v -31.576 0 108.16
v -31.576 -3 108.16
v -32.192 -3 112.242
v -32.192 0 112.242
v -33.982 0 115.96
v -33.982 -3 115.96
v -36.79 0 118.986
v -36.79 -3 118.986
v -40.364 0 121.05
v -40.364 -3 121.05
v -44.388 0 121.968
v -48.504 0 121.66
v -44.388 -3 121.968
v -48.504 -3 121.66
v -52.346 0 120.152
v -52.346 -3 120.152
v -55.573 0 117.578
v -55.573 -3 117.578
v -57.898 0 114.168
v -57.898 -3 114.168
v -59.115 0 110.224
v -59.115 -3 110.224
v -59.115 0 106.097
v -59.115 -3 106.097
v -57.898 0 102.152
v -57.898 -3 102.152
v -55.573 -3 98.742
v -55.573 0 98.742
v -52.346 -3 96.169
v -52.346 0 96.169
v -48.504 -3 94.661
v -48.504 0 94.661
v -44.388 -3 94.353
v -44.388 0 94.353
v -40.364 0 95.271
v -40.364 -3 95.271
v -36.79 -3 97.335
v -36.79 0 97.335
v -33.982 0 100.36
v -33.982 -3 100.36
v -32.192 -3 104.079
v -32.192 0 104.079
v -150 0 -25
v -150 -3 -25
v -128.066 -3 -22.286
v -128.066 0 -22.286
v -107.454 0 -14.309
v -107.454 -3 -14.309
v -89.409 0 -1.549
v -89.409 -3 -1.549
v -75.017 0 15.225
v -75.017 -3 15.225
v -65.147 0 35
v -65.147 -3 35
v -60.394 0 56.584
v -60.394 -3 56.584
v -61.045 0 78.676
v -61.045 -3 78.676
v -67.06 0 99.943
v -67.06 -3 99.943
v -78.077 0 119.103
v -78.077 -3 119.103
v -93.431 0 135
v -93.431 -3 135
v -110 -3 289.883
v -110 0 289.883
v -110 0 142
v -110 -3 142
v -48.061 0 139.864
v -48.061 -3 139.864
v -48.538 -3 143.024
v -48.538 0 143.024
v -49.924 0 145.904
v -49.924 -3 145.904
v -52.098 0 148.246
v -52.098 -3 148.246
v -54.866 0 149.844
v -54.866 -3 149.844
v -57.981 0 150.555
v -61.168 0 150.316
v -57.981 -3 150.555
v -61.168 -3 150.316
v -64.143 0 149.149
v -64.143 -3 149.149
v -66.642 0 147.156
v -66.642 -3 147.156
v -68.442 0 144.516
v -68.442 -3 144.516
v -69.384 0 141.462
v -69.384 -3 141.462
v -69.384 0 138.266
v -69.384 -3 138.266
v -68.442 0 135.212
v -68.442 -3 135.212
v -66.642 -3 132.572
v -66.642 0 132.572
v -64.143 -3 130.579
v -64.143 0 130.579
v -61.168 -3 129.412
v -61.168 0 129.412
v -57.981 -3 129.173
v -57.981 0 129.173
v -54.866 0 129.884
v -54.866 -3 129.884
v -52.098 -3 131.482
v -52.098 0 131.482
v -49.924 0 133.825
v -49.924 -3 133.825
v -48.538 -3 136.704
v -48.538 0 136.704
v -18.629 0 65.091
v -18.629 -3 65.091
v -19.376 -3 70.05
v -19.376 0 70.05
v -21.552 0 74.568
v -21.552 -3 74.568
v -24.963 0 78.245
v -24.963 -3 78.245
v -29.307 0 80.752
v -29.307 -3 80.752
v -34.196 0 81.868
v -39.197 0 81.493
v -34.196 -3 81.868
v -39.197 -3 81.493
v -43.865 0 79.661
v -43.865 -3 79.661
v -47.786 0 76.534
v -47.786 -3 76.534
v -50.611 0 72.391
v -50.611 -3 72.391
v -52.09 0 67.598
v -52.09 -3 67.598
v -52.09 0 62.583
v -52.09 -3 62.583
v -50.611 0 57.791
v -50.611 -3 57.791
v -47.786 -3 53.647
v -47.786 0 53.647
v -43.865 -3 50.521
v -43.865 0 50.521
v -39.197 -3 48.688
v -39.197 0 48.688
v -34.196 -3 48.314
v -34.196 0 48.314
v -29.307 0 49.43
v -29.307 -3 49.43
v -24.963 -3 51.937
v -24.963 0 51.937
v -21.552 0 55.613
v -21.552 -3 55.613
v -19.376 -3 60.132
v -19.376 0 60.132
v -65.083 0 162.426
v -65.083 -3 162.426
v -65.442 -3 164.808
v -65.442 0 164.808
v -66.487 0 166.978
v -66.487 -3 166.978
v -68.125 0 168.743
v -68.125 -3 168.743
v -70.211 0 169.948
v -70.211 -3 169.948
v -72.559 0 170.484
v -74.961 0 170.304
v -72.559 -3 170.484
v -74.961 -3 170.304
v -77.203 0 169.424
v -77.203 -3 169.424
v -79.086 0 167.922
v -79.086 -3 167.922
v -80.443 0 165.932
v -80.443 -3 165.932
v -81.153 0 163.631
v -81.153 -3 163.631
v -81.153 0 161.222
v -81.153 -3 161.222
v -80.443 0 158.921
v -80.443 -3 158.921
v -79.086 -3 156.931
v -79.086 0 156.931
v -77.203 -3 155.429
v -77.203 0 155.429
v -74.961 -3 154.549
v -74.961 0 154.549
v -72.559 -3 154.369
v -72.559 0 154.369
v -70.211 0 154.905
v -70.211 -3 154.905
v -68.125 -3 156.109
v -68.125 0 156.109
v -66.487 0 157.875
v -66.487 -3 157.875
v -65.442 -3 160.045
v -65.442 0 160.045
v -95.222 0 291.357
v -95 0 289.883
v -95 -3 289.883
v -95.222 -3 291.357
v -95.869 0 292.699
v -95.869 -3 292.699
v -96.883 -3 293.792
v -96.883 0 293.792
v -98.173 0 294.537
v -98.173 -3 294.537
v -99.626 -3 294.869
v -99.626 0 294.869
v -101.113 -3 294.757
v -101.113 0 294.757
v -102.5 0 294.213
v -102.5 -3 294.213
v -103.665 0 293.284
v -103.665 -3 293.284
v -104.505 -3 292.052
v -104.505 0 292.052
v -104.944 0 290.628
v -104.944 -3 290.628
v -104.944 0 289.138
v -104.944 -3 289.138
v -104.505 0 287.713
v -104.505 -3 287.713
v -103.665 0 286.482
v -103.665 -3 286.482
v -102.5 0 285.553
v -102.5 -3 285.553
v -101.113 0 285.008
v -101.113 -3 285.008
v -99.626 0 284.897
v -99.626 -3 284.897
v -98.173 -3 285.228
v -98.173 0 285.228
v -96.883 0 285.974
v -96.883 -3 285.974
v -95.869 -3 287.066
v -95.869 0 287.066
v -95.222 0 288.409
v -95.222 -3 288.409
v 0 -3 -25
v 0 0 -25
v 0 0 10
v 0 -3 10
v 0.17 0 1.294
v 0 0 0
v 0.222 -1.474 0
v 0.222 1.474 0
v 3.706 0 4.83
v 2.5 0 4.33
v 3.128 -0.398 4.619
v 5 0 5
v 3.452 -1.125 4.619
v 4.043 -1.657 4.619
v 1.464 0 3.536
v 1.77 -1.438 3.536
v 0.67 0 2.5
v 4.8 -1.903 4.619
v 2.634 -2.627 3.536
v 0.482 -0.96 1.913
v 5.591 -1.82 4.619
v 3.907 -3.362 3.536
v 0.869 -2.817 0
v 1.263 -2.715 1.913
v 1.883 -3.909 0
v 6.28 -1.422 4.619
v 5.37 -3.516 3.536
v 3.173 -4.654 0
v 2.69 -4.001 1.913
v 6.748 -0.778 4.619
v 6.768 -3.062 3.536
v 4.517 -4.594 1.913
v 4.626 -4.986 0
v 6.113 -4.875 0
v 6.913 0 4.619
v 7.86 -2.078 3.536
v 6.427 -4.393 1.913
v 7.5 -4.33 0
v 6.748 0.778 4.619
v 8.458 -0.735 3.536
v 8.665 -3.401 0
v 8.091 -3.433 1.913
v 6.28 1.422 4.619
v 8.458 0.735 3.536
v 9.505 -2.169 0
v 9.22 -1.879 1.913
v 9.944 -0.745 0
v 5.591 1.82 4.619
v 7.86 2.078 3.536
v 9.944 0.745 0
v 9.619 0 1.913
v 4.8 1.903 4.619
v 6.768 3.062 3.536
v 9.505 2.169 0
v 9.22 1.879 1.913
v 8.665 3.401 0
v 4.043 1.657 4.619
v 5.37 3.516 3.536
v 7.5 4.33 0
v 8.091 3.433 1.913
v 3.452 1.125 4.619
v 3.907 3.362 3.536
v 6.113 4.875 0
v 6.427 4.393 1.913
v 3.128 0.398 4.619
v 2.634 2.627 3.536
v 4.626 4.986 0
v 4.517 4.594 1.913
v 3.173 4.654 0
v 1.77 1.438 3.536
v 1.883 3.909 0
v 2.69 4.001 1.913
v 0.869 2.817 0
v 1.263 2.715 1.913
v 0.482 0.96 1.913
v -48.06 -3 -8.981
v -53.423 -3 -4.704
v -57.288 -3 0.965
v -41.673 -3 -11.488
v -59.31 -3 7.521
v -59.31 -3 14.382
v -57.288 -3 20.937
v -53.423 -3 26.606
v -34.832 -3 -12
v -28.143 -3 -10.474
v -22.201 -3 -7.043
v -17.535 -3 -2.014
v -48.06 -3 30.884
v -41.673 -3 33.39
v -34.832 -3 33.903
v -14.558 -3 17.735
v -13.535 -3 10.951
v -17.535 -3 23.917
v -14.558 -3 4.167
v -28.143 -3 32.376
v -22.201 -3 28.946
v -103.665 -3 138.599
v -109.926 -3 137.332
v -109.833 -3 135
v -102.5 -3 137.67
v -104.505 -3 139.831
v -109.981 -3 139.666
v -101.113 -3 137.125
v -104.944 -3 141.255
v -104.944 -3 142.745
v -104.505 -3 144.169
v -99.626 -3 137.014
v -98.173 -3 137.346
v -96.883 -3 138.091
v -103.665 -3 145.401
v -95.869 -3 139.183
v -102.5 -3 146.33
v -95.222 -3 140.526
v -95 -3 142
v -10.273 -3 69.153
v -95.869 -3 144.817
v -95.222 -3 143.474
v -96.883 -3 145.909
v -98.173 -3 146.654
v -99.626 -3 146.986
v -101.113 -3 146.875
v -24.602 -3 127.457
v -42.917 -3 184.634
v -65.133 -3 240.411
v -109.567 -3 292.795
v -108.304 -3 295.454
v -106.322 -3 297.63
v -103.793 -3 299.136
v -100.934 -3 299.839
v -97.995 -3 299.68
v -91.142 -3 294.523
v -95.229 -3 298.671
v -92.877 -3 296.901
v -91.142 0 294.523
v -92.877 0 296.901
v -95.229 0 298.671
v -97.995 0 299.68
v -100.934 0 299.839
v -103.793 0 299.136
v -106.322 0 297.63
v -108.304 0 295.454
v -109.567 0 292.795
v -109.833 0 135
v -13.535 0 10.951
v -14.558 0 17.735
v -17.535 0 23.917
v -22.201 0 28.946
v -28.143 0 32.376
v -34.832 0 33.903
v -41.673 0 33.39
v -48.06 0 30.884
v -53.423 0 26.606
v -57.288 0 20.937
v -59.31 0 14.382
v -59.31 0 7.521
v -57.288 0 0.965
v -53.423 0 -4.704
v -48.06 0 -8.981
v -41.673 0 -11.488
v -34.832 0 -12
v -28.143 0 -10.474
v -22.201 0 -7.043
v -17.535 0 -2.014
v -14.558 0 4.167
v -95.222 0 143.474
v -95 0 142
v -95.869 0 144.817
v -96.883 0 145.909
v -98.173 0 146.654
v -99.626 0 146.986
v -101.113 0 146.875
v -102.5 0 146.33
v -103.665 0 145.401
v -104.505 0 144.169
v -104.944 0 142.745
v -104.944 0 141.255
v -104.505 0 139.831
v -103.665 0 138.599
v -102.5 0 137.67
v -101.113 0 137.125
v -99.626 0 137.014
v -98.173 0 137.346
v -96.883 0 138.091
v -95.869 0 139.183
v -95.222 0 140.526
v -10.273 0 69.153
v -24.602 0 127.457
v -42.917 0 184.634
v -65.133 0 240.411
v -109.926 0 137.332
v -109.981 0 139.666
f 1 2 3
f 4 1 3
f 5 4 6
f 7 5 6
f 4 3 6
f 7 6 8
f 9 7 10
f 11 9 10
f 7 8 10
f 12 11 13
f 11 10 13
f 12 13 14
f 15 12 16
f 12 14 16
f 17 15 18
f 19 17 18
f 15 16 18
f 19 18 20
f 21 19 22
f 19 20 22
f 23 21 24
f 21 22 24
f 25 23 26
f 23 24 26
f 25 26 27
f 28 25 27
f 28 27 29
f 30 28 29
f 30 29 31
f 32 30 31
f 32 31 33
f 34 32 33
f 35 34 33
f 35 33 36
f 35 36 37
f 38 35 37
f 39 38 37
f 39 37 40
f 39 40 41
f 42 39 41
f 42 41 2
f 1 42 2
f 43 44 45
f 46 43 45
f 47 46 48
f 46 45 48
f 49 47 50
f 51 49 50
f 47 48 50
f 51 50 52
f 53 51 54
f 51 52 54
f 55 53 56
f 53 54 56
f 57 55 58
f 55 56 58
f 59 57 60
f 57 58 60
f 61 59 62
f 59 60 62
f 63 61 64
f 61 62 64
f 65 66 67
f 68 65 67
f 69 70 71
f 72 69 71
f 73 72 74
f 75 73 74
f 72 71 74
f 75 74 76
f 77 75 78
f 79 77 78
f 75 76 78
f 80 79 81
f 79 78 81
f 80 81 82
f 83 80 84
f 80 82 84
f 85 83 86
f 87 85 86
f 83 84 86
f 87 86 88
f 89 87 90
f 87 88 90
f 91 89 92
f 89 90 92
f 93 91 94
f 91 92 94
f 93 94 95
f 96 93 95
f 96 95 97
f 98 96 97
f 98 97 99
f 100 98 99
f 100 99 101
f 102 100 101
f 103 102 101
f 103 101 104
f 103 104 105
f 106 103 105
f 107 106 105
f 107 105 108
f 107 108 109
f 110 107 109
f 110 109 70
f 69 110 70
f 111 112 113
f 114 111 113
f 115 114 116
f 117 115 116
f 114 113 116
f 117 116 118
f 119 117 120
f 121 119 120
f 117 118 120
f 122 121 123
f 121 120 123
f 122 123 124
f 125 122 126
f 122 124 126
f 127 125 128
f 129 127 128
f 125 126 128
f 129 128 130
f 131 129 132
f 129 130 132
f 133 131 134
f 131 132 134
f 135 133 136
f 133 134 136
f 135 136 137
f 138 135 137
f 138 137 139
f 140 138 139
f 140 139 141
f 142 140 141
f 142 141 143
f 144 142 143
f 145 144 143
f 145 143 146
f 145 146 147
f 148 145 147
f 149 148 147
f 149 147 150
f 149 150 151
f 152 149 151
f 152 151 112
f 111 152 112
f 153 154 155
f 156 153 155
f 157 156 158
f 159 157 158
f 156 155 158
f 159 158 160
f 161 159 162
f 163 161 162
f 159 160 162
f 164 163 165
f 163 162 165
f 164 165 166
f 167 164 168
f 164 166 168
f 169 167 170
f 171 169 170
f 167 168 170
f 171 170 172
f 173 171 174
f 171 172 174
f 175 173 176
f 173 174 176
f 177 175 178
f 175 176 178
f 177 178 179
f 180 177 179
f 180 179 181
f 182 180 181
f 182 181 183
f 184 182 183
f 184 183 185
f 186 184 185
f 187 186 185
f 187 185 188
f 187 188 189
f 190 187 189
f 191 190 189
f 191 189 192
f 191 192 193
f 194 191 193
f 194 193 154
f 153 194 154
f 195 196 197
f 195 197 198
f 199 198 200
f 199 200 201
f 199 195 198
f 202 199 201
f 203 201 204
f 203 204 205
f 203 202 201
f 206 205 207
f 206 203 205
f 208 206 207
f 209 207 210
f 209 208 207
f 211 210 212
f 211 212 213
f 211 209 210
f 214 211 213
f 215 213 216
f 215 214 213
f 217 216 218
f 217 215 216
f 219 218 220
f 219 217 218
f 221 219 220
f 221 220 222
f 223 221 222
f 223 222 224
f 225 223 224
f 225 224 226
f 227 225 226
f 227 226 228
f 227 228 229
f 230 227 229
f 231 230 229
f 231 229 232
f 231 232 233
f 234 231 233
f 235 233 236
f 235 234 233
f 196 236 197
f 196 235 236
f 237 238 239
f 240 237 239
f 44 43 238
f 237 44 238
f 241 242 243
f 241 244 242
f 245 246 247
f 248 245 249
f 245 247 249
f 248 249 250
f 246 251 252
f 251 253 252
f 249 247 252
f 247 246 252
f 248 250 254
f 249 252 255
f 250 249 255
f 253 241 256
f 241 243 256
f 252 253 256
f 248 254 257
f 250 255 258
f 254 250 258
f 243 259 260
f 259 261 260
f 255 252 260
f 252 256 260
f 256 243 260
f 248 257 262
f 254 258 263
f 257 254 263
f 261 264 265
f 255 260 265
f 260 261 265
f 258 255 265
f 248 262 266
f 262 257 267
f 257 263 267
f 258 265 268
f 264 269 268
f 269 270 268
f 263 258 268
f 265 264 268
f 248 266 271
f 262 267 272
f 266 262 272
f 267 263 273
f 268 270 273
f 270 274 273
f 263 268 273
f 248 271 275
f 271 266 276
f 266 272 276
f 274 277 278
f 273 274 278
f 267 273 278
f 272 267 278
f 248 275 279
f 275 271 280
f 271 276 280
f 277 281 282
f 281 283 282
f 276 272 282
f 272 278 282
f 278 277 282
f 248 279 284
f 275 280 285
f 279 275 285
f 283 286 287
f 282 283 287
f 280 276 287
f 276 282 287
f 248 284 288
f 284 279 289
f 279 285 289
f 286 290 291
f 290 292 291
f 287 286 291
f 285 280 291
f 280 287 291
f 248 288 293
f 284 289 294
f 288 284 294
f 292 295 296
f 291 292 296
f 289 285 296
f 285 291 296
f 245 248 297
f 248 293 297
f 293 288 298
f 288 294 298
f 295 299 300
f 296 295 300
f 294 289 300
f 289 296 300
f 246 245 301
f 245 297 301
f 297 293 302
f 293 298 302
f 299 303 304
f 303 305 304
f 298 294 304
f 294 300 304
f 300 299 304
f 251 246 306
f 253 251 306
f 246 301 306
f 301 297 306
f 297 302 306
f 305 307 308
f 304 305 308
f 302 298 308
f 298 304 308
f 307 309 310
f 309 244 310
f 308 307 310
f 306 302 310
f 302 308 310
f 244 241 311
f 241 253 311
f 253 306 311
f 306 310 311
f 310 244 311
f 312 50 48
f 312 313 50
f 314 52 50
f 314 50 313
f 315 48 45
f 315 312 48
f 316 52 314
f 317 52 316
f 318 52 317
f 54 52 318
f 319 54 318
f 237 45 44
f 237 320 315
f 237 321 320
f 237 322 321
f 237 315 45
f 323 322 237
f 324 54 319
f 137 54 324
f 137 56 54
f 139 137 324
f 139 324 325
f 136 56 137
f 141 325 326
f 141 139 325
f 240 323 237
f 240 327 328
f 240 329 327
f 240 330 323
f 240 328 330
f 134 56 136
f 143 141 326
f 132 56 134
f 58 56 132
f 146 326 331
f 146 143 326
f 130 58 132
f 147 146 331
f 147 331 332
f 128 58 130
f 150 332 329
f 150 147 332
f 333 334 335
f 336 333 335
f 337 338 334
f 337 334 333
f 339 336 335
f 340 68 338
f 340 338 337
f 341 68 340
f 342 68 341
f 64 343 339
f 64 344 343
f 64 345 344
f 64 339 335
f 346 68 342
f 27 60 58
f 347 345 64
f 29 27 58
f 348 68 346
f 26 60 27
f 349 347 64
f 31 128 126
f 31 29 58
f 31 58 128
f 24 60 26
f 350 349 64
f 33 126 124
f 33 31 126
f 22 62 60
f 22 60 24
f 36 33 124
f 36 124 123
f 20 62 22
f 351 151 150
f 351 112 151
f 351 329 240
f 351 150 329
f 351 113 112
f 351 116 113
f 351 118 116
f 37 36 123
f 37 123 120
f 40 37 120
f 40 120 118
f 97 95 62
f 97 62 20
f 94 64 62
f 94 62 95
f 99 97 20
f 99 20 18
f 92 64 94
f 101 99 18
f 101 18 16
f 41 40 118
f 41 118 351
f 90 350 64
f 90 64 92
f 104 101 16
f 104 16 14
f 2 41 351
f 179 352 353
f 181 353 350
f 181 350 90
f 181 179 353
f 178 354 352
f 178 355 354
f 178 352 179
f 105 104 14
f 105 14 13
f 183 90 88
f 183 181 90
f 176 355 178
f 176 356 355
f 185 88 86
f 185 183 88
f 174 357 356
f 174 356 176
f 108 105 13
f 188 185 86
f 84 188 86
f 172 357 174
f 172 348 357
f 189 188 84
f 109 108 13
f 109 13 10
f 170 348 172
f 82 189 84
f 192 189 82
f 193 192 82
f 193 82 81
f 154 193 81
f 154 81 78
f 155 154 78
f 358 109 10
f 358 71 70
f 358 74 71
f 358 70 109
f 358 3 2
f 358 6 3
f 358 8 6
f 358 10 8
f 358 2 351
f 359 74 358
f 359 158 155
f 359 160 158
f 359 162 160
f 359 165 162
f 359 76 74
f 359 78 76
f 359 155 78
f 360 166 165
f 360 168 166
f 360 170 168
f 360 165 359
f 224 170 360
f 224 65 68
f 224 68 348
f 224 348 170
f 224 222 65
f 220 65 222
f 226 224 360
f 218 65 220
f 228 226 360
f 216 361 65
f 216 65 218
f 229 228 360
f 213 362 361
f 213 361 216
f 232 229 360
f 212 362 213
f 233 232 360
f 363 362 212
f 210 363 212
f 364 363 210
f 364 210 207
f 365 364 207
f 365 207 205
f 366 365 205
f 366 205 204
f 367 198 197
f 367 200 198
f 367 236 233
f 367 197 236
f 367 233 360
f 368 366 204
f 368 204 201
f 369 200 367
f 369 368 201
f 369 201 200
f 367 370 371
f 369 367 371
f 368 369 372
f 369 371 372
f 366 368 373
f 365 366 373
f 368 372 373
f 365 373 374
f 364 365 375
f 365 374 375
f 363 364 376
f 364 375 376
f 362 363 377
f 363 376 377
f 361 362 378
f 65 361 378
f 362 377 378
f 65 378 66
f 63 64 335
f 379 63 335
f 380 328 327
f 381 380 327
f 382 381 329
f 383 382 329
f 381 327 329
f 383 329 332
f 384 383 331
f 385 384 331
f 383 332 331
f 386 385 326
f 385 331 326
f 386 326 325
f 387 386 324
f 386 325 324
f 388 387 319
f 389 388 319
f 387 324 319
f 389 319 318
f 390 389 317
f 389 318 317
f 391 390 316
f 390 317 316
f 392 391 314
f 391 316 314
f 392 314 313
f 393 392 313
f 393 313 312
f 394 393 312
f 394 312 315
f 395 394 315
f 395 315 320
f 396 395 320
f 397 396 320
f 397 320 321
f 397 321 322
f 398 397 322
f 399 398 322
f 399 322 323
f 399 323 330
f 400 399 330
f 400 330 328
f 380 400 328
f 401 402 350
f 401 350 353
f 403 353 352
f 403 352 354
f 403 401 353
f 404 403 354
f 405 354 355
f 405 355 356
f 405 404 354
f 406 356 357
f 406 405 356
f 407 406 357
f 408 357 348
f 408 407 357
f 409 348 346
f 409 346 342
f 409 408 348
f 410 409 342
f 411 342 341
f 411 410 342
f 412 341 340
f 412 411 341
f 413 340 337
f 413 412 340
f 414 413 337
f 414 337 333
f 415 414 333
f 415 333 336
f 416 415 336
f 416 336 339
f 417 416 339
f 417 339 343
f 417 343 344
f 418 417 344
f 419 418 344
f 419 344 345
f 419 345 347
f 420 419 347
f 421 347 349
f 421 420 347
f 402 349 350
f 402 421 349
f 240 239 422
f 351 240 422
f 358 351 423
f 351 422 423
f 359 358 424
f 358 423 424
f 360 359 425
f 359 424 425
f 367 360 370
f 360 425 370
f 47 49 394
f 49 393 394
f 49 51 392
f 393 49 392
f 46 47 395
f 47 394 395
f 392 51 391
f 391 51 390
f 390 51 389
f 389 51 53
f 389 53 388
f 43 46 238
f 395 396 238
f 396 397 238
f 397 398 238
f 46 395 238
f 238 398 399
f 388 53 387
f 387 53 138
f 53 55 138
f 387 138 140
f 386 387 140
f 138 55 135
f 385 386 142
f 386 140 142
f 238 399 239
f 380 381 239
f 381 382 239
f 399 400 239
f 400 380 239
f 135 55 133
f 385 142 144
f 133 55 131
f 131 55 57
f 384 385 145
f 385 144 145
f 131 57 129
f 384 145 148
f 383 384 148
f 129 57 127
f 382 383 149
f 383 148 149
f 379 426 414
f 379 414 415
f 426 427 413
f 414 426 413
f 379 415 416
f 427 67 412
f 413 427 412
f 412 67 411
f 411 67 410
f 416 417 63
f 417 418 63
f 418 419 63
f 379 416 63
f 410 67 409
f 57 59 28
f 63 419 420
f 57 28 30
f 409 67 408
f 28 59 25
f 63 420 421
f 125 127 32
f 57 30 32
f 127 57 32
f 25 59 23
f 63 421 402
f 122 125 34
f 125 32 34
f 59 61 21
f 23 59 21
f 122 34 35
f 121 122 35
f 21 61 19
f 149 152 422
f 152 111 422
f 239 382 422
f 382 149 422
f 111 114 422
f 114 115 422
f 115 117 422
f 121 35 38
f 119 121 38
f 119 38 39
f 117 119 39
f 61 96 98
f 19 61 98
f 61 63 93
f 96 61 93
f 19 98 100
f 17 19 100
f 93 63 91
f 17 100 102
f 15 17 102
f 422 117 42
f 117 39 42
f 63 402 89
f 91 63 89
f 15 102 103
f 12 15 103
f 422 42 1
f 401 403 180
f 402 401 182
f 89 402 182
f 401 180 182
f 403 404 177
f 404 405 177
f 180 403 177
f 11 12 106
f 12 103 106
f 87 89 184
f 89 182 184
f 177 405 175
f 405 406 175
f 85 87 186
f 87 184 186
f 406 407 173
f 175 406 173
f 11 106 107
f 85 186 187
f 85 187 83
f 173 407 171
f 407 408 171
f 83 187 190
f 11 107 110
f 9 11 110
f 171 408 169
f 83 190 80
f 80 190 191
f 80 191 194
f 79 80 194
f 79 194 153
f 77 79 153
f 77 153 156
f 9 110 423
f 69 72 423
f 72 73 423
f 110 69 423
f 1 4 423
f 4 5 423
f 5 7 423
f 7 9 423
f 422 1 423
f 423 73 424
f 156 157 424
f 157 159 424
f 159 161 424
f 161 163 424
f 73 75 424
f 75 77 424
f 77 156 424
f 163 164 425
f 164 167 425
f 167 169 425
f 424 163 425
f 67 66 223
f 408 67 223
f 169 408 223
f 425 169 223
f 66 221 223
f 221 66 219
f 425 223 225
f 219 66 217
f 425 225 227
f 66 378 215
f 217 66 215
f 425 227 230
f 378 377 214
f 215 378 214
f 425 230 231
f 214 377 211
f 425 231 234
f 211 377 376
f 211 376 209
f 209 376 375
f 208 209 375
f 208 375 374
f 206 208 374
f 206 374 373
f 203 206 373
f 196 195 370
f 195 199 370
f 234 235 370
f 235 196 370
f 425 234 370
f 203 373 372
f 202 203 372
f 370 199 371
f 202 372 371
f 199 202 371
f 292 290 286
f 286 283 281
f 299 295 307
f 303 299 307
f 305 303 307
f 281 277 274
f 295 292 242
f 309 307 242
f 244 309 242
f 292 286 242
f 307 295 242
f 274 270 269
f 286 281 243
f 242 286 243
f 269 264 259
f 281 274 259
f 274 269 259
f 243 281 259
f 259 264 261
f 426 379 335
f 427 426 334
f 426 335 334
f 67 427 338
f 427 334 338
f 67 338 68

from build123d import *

# Parameters (mm, degrees)
F0_W     = 150
F0_H     = 25
F0_H_2   = 10
F0_R     = 5
F1_DEPTH = 3
F3_DEPTH = 25
F5_DEPTH = 25
F8_R     = 10.7211625117
F8_R_2   = 13.8464579222
F8_R_3   = 8.0798767628
F8_R_4   = 16.8242578826
F8_R_5   = 23.016028867
F9_DEPTH = 25


with BuildPart() as f1:
    # F0 (on Front) → F1 (new body)
    with BuildSketch(Plane.XZ):
        with BuildLine():
            Line((-150, 10), (0, 10))
            ThreePointArc((0, 10), (-33.2661460942, 156.2032895521), (-91.1419153466, 294.5233303461))
            ThreePointArc((-91.1419153466, 294.5233303461), (-90.2896743995, 292.2722920615), (-90, 289.88282))
            ThreePointArc((-90, 289.88282), (-100, 279.88282), (-110, 289.88282))
            Line((-110, 289.88282), (-110, 142))
            ThreePointArc((-110, 142), (-107.4839490045, 110.5993630638), (-100, 80))
            ThreePointArc((-100, 80), (-107.2195262824, 32.2996616303), (-150, 10))
        make_face()
        with BuildLine():
            ThreePointArc((-90, 142), (-100, 132), (-110, 142))
            ThreePointArc((-110, 142), (-100, 152), (-90, 142))
        make_face(mode=Mode.SUBTRACT)
        with Locations((-75, -12.5)):
            Rectangle(F0_W, F0_H)
        with Locations((-75, 5)):
            Rectangle(F0_W, F0_H_2)
        with BuildLine():
            ThreePointArc((-90, 142), (-100, 152), (-110, 142))
            ThreePointArc((-110, 142), (-100, 132), (-90, 142))
        make_face()
        with Locations((-100, 142)):
            Circle(F0_R, mode=Mode.SUBTRACT)
        with BuildLine():
            ThreePointArc((-90, 289.88282), (-90.2896743995, 292.2722920615), (-91.1419153466, 294.5233303461))
            ThreePointArc((-91.1419153466, 294.5233303461), (-102.3894720615, 299.5931456005), (-110, 289.88282))
            ThreePointArc((-110, 289.88282), (-100, 279.88282), (-90, 289.88282))
        make_face()
        with Locations((-100, 289.88282)):
            Circle(F0_R, mode=Mode.SUBTRACT)
    extrude(amount=F1_DEPTH)

    # F2 (on face) → F3 (cut)
    with BuildSketch(Plane.XZ.offset(3)):
        with BuildLine():
            ThreePointArc((-79.2831779252, 52.1890875227), (-102.1084716389, 94.5407460068), (-110, 142))
            ThreePointArc((-110, 142), (-107.4839490045, 110.5993630638), (-100, 80))
            ThreePointArc((-100, 80), (-107.2195262824, 32.2996616303), (-150, 10))
            Line((-150, 10), (-150, -25))
            ThreePointArc((-150, -25), (-97.6573210541, -1.9656019834), (-79.2831779252, 52.1890875227))
        make_face()
    extrude(amount=-F3_DEPTH, mode=Mode.SUBTRACT)

    # F4 (on face) → F5 (cut)
    with BuildSketch(Plane.XZ.offset(3)):
        with BuildLine():
            Line((-93.4314575051, 135), (-109.8328454789, 135))
            ThreePointArc((-109.8328454789, 135), (-100.9359591666, 91.2416633391), (-79.2831779252, 52.1890875227))
            ThreePointArc((-79.2831779252, 52.1890875227), (-97.6573210541, -1.9656019834), (-150, -25))
            ThreePointArc((-150, -25), (-65.1471862576, 35), (-93.4314575051, 135))
        make_face()
    extrude(amount=-F5_DEPTH, mode=Mode.SUBTRACT)

    # F8 (on face) → F9 (cut)
    with BuildSketch(Plane.XZ.offset(3)):
        with Locations((-58.7824434042, 139.864102006)):
            Circle(F8_R)
        with Locations((-45.4229526222, 108.1602498889)):
            Circle(F8_R_2)
        with Locations((-73.1631368399, 162.4263375998)):
            Circle(F8_R_3)
        with Locations((-35.4531854391, 65.090842545)):
            Circle(F8_R_4)
        with Locations((-36.5515090525, 10.9512181953)):
            Circle(F8_R_5)
    extrude(amount=-F9_DEPTH, mode=Mode.SUBTRACT)


with BuildPart() as f7:
    # F6 (on Front) → F7 (revolve)
    with BuildSketch(Plane.XZ):
        with BuildLine():
            ThreePointArc((5, 5), (1.4644660941, 3.5355339059), (0, 0))
            Line((0, 0), (5, 0))
            Line((5, 0), (5, 5))
        make_face()
    revolve(axis=Axis((5, 0, 5.9799733572), (0, 0, 1)))


solid = Compound([f1.part, f7.part])
